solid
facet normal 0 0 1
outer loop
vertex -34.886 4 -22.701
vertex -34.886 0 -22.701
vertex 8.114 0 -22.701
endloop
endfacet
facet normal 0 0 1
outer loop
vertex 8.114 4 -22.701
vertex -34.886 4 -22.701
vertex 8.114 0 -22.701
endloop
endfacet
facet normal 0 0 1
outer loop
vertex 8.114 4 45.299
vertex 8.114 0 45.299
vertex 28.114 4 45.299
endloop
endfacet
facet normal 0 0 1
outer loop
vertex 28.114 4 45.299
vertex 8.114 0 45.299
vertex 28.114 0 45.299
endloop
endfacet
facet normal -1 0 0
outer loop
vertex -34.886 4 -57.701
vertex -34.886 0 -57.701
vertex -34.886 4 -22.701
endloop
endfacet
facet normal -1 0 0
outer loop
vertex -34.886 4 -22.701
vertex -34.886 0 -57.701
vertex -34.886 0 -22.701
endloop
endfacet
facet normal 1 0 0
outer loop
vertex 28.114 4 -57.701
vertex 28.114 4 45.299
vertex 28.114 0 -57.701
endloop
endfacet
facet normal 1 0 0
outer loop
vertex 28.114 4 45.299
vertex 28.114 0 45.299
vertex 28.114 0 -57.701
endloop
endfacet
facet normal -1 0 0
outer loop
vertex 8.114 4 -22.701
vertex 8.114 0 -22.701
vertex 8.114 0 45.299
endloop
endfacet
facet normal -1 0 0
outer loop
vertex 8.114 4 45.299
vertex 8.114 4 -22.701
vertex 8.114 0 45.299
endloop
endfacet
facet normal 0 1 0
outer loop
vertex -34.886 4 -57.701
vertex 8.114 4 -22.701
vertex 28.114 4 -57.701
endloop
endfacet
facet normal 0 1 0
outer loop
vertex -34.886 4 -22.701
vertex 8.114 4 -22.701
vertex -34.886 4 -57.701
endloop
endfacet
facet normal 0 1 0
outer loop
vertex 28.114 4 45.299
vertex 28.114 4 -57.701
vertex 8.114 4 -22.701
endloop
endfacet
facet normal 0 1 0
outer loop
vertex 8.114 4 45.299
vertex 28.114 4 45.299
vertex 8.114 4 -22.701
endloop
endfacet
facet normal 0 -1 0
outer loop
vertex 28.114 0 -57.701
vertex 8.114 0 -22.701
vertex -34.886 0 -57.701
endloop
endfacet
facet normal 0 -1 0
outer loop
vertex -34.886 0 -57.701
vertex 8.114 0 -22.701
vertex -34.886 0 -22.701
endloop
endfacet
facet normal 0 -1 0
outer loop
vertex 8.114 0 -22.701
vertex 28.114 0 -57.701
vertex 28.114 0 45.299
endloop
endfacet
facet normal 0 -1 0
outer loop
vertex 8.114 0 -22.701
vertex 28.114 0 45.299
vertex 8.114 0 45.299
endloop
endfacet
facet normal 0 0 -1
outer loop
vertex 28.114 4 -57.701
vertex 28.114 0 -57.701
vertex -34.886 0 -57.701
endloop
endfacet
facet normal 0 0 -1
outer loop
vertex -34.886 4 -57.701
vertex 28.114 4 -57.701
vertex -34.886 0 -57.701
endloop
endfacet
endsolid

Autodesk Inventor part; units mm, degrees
ref_plane "YZ Plane" through (0, 0, 0) normal (1, 0, 0) x (0, 1, 0)
ref_plane "XZ Plane" through (0, 0, 0) normal (0, 1, 0) x (-1, 0, 0)
ref_plane "XY Plane" through (0, 0, 0) normal (0, 0, 1) x (1, 0, 0)
sketch "Szkic1" plane through (0, 0, 0) normal (0, 1, 0) x (-1, 0, 0)
  line L0 (34.8855, -22.7009) -> (-28.1145, -22.7009)
  line L1 (-28.1145, -22.7009) -> (-28.1145, -57.7009)
  line L2 (-28.1145, -57.7009) -> (34.8855, -57.7009)
  line L3 (34.8855, -57.7009) -> (34.8855, -22.7009)
  line L4 (-28.1145, -57.7009) -> (-8.1145, -57.7009)
  line L5 (-8.1145, -57.7009) -> (-8.1145, 45.2991)
  line L6 (-8.1145, 45.2991) -> (-28.1145, 45.2991)
  line L7 (-28.1145, 45.2991) -> (-28.1145, -57.7009)
  point P0 (0, 0)
  point P1 (-8.1145, -22.7009)
  dimension "d0" = 63
  dimension "d1" = 35
  dimension "d2" = 103
  dimension "d3" = 20
extrude "Wyciągnięcie proste1" add sketch "Szkic1" along normal blind 4
properties part number "S5_Mainboard"
